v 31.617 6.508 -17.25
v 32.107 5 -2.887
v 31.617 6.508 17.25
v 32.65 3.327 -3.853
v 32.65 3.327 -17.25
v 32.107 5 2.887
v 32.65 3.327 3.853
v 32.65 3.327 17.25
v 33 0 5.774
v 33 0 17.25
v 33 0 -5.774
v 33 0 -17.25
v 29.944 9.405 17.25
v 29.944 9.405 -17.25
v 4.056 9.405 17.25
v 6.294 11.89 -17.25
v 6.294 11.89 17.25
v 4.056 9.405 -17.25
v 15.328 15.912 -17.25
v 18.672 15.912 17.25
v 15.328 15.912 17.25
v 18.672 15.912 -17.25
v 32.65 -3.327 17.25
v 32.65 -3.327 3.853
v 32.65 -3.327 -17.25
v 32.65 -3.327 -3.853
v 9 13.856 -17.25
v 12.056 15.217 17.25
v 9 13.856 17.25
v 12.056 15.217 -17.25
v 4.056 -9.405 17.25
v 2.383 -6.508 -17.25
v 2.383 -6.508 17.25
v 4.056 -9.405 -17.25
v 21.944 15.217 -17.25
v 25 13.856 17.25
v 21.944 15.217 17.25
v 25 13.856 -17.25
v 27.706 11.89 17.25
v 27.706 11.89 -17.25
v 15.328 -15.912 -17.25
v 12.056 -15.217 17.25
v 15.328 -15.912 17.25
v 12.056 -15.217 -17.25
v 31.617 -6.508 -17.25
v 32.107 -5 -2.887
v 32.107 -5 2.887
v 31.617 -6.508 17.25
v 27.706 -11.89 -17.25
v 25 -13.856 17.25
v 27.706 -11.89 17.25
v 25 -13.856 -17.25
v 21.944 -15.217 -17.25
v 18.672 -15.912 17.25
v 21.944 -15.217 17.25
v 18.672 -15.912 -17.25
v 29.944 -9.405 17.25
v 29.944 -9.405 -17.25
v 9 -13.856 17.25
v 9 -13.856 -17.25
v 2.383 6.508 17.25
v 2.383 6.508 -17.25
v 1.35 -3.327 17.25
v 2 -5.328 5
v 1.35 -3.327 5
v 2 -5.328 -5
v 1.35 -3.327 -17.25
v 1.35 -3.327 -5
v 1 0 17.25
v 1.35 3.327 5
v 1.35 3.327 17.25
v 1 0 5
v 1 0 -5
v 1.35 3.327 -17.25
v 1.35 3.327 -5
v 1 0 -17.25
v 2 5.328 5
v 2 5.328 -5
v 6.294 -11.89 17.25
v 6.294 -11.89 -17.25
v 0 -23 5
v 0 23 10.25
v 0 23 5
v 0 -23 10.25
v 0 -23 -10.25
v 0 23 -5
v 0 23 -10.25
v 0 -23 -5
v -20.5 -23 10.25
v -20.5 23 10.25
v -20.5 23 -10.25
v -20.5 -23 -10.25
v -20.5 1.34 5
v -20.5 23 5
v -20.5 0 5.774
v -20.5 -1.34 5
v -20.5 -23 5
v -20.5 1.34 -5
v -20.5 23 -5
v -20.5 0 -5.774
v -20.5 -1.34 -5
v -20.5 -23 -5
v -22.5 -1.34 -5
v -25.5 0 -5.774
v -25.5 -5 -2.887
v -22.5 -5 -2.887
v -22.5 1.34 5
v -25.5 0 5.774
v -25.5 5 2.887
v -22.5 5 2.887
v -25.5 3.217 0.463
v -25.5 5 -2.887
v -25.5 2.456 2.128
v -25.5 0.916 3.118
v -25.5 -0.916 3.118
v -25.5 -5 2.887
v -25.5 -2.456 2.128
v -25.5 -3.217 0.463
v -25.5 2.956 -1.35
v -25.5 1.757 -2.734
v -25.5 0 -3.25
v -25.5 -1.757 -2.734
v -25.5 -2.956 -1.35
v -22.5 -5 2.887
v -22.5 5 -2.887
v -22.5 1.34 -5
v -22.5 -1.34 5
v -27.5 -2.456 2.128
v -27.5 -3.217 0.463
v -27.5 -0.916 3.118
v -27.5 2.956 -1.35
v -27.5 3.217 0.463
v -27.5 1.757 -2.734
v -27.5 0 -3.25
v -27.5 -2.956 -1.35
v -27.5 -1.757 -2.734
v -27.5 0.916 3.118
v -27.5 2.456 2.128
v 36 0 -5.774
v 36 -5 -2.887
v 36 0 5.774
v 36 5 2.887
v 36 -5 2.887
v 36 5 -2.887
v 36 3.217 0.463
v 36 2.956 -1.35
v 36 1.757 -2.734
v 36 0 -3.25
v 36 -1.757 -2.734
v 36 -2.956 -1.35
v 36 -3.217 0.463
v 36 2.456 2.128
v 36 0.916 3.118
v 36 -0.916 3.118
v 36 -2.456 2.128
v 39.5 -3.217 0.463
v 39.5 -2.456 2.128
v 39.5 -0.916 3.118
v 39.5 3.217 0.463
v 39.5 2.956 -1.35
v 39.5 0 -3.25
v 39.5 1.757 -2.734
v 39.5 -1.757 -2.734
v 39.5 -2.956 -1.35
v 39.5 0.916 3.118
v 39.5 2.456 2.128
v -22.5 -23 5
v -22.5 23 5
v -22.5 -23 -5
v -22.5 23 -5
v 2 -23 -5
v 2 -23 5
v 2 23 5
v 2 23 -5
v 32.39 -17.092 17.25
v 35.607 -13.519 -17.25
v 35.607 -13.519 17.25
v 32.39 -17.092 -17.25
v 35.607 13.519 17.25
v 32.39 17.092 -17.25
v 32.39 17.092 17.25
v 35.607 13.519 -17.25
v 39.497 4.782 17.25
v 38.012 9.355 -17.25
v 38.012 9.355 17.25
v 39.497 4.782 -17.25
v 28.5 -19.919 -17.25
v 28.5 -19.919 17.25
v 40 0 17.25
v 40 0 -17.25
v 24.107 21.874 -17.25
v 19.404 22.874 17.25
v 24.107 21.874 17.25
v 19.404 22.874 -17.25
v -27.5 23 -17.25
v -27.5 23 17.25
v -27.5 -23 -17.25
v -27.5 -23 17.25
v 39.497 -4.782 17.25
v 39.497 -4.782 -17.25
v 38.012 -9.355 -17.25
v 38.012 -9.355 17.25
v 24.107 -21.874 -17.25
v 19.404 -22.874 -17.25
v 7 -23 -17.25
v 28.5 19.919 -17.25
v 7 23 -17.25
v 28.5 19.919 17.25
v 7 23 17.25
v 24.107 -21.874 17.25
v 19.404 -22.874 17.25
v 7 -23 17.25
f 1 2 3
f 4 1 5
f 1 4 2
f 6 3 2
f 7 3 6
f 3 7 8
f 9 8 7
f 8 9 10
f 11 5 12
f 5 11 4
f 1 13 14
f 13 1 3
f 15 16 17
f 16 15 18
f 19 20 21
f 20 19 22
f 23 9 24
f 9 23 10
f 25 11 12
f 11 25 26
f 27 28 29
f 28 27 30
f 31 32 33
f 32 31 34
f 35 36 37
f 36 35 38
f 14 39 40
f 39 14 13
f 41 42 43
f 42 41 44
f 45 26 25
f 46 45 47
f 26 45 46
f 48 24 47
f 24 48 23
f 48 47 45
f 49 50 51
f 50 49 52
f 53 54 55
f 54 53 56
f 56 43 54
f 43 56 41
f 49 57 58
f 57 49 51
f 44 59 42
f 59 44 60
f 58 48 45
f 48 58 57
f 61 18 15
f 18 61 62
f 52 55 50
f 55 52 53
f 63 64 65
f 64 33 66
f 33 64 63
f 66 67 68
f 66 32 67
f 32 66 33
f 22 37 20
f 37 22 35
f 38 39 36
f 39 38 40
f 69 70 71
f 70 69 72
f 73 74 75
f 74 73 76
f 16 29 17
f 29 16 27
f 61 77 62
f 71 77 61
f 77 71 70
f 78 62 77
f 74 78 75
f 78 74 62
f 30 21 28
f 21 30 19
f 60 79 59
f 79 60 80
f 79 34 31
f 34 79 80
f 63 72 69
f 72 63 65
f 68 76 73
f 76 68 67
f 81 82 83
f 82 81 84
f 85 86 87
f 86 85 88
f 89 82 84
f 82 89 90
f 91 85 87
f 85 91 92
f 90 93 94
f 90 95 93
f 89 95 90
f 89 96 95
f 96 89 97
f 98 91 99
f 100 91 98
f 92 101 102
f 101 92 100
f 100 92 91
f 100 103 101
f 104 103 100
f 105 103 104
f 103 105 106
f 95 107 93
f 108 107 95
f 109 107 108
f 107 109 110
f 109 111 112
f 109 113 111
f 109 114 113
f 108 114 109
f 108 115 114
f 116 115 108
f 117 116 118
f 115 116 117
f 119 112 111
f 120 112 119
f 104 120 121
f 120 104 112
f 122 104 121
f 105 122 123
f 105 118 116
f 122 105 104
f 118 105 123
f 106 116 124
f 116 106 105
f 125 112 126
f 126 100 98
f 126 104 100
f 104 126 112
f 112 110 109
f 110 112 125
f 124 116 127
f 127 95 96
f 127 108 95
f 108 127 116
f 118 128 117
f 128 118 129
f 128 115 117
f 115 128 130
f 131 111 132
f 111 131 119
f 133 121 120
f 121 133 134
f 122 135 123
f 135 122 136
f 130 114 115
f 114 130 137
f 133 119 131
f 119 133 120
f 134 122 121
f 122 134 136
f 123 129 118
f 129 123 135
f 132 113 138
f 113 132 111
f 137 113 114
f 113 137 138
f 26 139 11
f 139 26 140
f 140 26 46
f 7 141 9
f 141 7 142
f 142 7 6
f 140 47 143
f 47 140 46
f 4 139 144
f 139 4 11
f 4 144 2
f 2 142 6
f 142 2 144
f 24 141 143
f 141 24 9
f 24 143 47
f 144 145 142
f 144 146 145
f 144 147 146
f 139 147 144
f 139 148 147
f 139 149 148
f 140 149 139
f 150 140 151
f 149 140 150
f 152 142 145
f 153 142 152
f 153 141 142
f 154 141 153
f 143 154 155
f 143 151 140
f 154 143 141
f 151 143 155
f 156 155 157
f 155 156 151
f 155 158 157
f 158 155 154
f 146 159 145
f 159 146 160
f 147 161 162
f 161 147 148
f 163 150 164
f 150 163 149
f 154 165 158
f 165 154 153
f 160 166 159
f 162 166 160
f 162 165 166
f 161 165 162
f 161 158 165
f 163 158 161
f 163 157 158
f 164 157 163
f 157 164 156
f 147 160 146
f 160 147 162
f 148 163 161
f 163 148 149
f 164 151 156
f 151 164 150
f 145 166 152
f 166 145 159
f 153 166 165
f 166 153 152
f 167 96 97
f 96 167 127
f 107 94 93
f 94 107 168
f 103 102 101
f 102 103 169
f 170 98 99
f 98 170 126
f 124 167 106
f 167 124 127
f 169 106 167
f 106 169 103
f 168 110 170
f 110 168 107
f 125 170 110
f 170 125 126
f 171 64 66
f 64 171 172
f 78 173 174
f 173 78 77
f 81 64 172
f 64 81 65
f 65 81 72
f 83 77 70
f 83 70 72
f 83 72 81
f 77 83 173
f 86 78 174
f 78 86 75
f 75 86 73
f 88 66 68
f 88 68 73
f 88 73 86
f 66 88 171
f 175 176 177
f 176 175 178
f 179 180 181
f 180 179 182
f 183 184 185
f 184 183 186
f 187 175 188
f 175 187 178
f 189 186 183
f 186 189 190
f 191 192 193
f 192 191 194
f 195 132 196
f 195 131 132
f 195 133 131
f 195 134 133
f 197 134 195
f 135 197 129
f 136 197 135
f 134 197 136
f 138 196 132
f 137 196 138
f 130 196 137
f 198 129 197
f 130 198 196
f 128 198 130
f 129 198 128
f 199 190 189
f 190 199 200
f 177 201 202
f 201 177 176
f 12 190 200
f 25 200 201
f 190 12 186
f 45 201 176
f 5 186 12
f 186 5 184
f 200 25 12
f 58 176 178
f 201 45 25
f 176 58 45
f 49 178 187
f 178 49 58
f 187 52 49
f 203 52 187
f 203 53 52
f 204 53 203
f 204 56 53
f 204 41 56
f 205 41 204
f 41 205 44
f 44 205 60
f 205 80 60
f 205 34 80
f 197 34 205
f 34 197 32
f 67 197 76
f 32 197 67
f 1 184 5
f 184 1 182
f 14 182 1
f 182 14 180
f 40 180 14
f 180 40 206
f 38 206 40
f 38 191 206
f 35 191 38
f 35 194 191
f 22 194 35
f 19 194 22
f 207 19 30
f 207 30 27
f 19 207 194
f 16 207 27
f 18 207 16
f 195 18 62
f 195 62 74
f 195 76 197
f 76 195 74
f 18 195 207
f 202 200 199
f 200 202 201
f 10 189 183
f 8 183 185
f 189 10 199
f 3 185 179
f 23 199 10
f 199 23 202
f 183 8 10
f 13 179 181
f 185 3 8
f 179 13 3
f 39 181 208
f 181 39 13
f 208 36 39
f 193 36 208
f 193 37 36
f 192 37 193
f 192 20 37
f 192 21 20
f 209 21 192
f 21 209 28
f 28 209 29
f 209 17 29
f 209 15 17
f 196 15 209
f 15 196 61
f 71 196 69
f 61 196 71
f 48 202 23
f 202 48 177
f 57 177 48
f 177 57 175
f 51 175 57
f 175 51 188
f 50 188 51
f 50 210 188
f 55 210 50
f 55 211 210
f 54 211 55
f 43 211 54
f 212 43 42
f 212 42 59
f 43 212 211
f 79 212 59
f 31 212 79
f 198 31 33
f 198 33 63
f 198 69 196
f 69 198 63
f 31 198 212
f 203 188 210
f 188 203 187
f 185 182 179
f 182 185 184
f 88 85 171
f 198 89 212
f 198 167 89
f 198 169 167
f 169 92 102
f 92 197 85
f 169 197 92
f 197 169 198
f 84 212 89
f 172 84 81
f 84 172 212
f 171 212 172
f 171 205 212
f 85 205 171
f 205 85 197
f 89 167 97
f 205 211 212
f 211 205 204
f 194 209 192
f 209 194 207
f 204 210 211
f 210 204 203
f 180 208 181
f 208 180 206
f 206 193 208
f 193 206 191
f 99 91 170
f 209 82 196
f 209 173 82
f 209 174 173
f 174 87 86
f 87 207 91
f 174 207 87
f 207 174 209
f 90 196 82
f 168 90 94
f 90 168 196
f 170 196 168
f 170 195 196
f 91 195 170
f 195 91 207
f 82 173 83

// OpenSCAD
// file: data-access.scad
// Norm Nuts and Bolts - a OpenSCAD library
// Copyright (C) 2012  Johannes Kneer

// This program is free software: you can redistribute it and/or modify
// it under the terms of the GNU General Public License as published by
// the Free Software Foundation, either version 3 of the License, or
// (at your option) any later version.

// This program is distributed in the hope that it will be useful,
// but WITHOUT ANY WARRANTY; without even the implied warranty of
// MERCHANTABILITY or FITNESS FOR A PARTICULAR PURPOSE.  See the
// GNU General Public License for more details.

// You should have received a copy of the GNU General Public License
// along with this program.  If not, see <http://www.gnu.org/licenses/>.


// DATABASE ACCESS FUNCTIONS AND CONSTANTS



// == CONSTANTS ==

// screw table access keys
_NB_S_DESC            = 0;
_NB_S_FAMKEY			    = 1;
_NB_S_LENGTH          = 2;
_NB_S_NOTHREAD_LENGTH = 3;

_NB_F_DESC			      = 0;
_NB_F_OUTER_DIA       = 1;
_NB_F_INNER_DIA       = 2;
_NB_F_LEAD            = 3;
_NB_F_KEY             = 4;
_NB_F_KEY_DEPTH       = 5;
_NB_F_HEAD_HEIGHT     = 6;
_NB_F_HEAD_DIA        = 7;
_NB_F_NUT_KEY         = 8;
_NB_F_NUT_HEIGHT      = 9;
_NB_F_PITCH_FINE      = 10;
_NB_F_PITCH_MEDIUM    = 11;
_NB_F_PITCH_COARSE    = 12;


// == FUNCTIONS ==

// _get_screw("descriptor")   with descriptor = M8x25
//   find the line for a general object in the data matrix

function _get_screw(n) = data_screw[search([n], data_screw)[0]];
function _get_screw_fam(n) = data_screw_fam[search([_get_screw(n)[_NB_S_FAMKEY]], data_screw_fam)[0]];

function _get_fam(n) = data_screw_fam[search([n], data_screw_fam)[0]];


// _get_XXXXX("descriptor") functions
// find a single property in the database

function _get_desc(n)        = _get_screw(n)[_NB_S_DESC];
function _get_famkey(n)         = _get_screw(n)[_NB_S_FAMKEY];
function _get_length(n)      = _get_screw(n)[_NB_S_LENGTH];
function _get_nt_length(n)   = _get_screw(n)[_NB_S_NOTHREAD_LENGTH];

function _get_outer_dia(n)   = _get_screw_fam(n)[_NB_F_OUTER_DIA];
function _get_inner_dia(n)   = _get_screw_fam(n)[_NB_F_INNER_DIA];
function _get_lead(n)        = _get_screw_fam(n)[_NB_F_LEAD];
function _get_head_height(n) = _get_screw_fam(n)[_NB_F_HEAD_HEIGHT];
function _get_head_dia(n)    = _get_screw_fam(n)[_NB_F_HEAD_DIA];
function _get_nut_key(n)     = _get_screw_fam(n)[_NB_F_NUT_KEY];
function _get_nut_height(n)  = _get_screw_fam(n)[_NB_F_NUT_HEIGHT];
function _get_fine_pitch(n)  = _get_screw_fam(n)[_NB_F_PITCH_FINE];
function _get_medium_pitch(n)  = _get_screw_fam(n)[_NB_F_PITCH_MEDIUM];
function _get_coarse_pitch(n)  = _get_screw_fam(n)[_NB_F_PITCH_COARSE];
// main file
// SatNOGS Yagi v2 Axis mount

//$fn = 20;

include <cyl_head_bolt.scad>;

// Variables

axis = 32; //Axis diameter
mast = 20.5; //Yagi width
w = 7; 	  //Mount wall width

module mount_outer(){
	union(){
		translate([axis/2+1,0,0])
			cylinder(d=axis+2*w,h=mast+2*w,center=true);
		translate([-mast/2,0,0])
			cube([mast+2*w,axis+2*w,mast+2*w],center=true);
	}
}

module mount_inner(){
	union(){
		translate([axis/2+1,0,0])
			cylinder(d=axis,h=mast+2*w+1,center=true);
		translate([-mast/2,0,0])
			cube([mast,axis+2*w+1,mast],center=true);
	}
}

module nutsbolts(){
	translate([-mast+1,0,0])
		rotate([0,90,0])
			nutcatch_parallel("M6", l=6);
	translate([-mast,0,0])
		rotate([0,90,0])
			cylinder(r=3.25,h=15,center=true);
	translate([axis+4,0,0])
		rotate([0,90,0])
			nutcatch_parallel("M6", l=8);
	translate([axis,0,0])
		rotate([0,90,0])
			cylinder(r=3.25,h=15,center=true);
}

module nipple_rail(){
	translate([-mast,0,0])
		cube([4,axis+2*w+1,10],center=true);
	cube([4,axis+2*w+1,10],center=true);
}

difference() {
	hull() {
		mount_outer();
	}
	mount_inner();
	nutsbolts();
	nipple_rail();
}
